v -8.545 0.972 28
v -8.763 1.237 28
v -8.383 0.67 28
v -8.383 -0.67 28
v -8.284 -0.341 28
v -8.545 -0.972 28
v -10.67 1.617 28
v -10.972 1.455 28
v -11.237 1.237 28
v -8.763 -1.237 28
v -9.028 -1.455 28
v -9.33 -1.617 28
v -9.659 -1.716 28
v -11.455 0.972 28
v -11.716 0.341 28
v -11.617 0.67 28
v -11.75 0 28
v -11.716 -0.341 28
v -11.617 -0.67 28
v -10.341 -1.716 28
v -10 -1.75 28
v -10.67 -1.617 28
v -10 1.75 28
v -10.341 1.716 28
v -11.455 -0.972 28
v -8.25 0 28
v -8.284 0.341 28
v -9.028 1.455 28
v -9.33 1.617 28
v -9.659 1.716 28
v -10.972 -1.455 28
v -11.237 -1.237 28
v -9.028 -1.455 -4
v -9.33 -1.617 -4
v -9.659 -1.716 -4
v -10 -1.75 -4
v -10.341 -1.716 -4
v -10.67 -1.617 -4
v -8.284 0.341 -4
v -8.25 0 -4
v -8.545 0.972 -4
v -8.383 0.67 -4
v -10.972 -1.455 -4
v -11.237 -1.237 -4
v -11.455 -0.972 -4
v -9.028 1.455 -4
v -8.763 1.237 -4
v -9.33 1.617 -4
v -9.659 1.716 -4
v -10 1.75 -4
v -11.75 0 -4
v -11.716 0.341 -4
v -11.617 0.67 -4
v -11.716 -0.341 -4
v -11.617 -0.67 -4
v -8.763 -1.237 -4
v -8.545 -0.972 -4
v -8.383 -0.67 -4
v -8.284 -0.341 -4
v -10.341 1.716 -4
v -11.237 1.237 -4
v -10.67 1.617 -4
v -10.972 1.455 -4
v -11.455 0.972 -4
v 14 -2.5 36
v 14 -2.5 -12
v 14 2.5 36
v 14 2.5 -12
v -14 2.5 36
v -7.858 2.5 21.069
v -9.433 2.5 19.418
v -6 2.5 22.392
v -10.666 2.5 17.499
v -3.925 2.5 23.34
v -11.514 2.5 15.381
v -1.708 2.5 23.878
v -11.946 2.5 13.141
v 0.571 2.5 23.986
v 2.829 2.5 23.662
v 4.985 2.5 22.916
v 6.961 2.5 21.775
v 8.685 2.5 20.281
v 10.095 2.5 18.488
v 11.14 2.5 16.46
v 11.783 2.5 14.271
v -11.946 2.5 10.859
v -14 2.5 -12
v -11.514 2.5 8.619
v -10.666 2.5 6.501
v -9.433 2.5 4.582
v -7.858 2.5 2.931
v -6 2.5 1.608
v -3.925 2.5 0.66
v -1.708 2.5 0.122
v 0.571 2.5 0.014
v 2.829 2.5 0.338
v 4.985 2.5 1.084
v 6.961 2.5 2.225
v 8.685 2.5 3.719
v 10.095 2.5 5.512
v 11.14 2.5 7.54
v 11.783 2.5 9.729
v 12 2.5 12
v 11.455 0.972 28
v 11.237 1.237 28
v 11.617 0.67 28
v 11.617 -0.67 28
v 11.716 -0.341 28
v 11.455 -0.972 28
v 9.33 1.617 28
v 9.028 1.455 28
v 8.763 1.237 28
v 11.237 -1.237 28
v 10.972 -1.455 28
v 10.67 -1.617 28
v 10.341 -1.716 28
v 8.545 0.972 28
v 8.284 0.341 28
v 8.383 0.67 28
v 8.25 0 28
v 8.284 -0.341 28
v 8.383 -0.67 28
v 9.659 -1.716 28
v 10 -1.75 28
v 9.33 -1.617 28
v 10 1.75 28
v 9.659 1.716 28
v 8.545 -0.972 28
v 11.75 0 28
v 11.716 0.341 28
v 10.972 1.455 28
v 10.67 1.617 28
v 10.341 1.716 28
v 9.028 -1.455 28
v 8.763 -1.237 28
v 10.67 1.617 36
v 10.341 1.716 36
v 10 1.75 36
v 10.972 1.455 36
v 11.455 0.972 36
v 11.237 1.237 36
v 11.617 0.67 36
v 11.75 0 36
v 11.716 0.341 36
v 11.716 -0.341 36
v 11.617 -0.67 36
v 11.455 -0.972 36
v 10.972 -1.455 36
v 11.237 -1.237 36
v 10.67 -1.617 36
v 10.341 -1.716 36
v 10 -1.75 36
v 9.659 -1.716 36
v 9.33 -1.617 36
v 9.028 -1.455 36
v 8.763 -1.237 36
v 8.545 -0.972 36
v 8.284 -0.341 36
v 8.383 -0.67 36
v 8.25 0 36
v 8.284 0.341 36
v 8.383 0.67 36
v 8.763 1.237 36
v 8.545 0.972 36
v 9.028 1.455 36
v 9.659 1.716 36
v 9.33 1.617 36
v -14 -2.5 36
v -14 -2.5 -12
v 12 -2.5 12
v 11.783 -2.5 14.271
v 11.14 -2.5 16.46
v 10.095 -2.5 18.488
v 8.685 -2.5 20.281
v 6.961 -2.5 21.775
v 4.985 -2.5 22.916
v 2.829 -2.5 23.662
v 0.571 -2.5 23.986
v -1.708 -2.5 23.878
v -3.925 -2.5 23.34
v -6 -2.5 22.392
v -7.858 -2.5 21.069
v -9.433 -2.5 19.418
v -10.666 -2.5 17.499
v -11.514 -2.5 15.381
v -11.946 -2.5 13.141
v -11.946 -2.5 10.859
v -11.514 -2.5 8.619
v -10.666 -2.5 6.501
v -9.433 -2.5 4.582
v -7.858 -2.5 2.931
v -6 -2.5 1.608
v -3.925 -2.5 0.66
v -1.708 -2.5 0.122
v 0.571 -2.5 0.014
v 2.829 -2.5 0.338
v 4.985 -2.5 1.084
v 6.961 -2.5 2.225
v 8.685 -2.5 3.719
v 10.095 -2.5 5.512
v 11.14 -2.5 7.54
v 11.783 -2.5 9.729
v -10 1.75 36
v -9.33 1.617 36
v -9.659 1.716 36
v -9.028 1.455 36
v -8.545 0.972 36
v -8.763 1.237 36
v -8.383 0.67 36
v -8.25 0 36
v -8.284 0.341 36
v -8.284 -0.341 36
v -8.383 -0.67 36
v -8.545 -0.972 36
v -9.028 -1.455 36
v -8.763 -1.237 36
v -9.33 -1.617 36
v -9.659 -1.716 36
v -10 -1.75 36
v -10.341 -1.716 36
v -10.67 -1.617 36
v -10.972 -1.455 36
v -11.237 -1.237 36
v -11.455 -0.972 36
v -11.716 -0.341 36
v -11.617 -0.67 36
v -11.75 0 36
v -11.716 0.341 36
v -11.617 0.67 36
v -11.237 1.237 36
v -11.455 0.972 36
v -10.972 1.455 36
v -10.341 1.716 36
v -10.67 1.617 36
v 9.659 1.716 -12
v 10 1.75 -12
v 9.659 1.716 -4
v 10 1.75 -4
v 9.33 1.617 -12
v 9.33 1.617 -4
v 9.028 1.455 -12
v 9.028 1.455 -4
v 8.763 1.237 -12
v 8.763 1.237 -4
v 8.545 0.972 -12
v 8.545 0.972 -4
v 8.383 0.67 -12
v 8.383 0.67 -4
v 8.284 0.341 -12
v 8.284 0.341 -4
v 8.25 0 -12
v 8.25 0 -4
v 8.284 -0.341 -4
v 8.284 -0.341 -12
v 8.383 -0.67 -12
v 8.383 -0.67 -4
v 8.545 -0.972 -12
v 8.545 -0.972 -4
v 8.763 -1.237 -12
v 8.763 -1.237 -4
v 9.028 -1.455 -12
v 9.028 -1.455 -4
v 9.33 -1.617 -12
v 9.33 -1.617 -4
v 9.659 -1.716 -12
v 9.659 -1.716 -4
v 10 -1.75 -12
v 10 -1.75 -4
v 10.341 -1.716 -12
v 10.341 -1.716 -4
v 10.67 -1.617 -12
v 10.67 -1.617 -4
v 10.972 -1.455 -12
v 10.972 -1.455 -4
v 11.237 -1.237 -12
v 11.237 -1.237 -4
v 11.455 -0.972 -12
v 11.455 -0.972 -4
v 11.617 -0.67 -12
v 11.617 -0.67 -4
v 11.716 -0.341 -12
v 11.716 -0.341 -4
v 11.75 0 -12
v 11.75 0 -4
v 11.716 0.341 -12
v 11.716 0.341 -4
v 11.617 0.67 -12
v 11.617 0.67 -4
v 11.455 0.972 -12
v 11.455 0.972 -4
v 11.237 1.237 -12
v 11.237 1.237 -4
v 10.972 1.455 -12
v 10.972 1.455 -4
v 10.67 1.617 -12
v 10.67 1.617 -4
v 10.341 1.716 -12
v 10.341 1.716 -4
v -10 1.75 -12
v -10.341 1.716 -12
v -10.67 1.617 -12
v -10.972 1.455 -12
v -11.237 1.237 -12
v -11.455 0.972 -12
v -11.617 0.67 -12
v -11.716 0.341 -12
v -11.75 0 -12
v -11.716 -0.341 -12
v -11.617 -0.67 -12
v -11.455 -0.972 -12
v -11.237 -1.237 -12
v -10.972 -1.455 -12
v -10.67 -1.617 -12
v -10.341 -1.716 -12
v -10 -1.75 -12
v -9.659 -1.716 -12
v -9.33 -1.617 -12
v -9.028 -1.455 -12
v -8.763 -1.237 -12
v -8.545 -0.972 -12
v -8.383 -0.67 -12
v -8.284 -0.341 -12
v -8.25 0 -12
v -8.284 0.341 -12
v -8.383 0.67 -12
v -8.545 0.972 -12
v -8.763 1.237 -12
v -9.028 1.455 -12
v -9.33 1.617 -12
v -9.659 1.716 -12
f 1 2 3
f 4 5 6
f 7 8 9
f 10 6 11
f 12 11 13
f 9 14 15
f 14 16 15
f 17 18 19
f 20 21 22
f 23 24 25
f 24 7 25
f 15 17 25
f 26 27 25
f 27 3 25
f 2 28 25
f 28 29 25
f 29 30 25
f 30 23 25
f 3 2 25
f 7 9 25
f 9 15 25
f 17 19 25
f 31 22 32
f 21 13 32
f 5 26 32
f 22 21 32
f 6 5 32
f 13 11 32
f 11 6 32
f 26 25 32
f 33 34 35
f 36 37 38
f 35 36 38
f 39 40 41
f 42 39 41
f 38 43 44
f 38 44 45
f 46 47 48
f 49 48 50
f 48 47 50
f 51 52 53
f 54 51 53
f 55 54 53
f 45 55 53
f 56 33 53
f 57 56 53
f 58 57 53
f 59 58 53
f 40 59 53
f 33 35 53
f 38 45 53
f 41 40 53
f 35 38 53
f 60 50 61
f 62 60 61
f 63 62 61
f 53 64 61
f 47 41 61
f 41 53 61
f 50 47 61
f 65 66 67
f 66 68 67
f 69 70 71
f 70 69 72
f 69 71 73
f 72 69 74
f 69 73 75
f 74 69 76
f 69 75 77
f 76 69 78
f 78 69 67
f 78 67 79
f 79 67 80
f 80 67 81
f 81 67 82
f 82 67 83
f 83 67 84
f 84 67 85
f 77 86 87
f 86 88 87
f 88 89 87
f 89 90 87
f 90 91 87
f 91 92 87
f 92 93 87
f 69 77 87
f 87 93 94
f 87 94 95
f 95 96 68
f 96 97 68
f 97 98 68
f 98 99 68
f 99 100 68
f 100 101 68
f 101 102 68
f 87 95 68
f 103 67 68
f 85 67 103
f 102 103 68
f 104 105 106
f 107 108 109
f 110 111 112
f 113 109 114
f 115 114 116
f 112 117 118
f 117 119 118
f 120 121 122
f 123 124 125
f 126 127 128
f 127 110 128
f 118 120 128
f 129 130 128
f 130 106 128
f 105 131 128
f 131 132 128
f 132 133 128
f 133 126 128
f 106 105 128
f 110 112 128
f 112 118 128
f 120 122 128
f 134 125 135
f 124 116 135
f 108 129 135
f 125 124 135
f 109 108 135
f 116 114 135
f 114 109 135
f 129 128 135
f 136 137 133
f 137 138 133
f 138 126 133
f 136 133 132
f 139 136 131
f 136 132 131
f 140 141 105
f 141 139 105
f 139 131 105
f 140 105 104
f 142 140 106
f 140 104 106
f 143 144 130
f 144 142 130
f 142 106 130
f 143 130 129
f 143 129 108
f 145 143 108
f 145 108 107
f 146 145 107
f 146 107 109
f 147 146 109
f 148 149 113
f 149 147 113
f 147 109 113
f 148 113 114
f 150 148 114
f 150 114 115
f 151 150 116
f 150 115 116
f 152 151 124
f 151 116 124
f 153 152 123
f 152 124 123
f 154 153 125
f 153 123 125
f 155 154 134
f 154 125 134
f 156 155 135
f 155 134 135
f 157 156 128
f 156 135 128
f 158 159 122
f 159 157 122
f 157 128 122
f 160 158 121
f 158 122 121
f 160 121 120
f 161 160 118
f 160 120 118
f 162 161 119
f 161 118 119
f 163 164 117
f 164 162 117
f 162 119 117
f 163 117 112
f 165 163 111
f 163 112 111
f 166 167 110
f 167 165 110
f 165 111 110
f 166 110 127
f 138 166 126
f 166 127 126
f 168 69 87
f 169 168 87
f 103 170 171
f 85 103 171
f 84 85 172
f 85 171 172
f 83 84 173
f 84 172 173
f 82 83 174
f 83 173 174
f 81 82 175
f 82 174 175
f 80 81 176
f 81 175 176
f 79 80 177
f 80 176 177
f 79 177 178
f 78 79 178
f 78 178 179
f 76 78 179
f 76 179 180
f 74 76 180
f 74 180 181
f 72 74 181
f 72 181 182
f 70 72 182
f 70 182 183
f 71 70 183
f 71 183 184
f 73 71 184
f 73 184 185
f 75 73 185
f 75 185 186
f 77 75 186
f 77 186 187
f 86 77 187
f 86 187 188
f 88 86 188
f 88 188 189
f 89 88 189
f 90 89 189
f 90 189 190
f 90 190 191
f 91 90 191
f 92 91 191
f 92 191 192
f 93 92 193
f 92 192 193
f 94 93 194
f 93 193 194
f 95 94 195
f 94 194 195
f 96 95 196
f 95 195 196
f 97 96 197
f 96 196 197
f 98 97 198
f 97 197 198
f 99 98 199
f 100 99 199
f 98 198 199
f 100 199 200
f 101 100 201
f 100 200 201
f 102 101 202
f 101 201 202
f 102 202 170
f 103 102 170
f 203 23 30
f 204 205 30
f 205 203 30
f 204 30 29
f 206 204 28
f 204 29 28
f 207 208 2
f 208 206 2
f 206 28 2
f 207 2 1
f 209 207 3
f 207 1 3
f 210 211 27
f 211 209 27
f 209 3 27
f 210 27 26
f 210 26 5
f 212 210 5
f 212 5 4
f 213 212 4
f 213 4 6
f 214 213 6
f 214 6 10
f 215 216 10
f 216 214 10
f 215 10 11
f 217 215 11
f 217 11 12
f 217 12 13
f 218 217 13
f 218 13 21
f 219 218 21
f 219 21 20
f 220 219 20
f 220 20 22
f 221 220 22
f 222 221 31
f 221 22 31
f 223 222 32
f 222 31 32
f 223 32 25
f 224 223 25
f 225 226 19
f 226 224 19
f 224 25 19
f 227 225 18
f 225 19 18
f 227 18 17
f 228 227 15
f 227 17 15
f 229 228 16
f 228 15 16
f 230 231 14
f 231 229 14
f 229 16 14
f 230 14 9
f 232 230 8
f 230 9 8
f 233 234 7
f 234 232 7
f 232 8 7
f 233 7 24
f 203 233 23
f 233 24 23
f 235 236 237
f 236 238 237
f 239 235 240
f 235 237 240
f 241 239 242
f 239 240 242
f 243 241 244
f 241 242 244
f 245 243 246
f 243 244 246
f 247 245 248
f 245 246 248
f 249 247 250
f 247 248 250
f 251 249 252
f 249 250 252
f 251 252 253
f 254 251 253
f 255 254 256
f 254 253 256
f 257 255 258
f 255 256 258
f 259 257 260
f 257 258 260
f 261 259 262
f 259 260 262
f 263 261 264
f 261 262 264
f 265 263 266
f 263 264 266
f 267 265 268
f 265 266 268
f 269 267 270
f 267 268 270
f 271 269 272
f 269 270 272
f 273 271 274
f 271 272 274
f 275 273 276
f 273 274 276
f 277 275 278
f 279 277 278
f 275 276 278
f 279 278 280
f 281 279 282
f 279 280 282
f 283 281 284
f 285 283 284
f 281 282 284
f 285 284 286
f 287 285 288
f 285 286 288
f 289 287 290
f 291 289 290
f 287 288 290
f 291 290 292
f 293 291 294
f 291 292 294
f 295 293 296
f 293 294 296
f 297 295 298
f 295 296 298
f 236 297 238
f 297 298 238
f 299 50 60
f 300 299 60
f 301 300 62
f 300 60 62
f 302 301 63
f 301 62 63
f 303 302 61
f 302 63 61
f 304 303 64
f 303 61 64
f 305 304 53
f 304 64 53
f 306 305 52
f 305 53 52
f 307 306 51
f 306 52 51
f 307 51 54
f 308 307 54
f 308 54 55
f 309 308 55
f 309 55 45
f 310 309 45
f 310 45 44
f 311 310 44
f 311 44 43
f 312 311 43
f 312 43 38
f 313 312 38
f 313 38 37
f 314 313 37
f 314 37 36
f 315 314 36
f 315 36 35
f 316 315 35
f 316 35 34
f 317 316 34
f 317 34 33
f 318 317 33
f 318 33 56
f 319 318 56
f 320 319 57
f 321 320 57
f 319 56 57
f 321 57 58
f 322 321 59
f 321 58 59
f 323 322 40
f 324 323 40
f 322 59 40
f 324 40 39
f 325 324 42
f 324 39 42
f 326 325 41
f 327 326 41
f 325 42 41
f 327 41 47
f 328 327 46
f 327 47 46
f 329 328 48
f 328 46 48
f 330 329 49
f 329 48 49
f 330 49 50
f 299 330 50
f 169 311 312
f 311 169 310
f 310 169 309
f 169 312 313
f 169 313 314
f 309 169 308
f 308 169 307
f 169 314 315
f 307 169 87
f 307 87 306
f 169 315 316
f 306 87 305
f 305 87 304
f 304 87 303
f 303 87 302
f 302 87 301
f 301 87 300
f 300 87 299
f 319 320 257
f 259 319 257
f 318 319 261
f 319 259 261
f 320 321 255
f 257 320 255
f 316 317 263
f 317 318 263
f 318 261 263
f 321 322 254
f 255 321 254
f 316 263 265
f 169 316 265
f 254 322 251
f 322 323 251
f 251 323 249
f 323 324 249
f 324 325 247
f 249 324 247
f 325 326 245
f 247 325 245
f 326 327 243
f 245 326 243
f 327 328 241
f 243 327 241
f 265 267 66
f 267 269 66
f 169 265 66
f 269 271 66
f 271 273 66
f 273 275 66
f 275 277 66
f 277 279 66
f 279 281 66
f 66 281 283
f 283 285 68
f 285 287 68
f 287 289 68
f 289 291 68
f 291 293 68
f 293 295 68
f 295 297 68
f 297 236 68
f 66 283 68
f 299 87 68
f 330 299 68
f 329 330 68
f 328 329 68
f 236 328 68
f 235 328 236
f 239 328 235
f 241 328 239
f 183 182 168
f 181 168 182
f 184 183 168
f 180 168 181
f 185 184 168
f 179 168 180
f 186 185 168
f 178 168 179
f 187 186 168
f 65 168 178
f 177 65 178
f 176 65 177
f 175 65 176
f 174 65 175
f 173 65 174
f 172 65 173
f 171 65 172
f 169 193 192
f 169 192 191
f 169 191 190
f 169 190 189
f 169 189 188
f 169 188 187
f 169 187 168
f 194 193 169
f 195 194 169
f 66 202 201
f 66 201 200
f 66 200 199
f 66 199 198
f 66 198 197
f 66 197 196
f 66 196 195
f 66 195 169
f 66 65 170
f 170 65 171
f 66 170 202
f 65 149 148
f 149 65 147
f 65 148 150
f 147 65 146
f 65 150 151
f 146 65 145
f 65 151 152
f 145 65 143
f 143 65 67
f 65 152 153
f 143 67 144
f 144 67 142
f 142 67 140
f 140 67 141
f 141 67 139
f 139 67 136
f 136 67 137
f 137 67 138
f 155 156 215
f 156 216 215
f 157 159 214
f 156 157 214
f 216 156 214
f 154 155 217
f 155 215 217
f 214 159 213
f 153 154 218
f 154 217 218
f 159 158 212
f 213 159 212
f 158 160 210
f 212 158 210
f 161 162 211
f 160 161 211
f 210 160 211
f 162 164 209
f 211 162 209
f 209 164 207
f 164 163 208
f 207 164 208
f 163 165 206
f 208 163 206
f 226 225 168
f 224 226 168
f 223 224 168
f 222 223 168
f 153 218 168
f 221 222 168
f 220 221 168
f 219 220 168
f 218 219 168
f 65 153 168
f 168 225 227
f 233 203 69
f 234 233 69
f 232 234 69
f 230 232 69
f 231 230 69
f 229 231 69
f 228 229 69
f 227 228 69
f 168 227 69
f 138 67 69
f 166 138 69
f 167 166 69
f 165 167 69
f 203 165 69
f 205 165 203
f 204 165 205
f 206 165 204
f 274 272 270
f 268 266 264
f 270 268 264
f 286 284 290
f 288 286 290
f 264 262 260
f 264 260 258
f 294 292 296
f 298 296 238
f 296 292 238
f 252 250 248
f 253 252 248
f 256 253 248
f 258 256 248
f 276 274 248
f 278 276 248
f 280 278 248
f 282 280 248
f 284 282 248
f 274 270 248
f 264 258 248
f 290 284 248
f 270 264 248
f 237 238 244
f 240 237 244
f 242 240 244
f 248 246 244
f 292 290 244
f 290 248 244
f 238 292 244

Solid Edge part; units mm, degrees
sketch "Sketch1" plane through (0, 0, 0) normal (0, -1, 0) x (1, 0, 0)
  line L0 (-14, -12) -> (14, -12)
  line L1 (14, -12) -> (14, 12)
  line L2 (14, 12) -> (-14, 12)
  line L3 (-14, 12) -> (-14, -12)
  dimension "D1" = 24
  dimension "D2" = 28
extrude "Protrusion1" add sketch "Sketch1" along normal mid plane 5
sketch "Sketch2" plane through (0, -2.5, 0) normal (0, -1, 0) x (1, 0, 0)
  circle A0 centre (0, 12) radius 12
  dimension "D1" = 24
extrude "Extrusionsausschnitt_1" cut sketch "Sketch2" against normal blind 221
hole "Bohrung_1" at (-10, 0, -12) direction (0, 0, 1) diameter 3.5 depth 8
hole "Hole1" at (10, 0, -12) direction (0, 0, 1) diameter 3.5 depth 8
mirror "Mirror1" about plane through (-13.5, 0, 12) normal (0, 0, 1) of "Protrusion1", "Extrusionsausschnitt_1", "Bohrung_1", "Hole1"
properties material "Aluminiumlegierung:3.0205, Al 99.0, EN-AW 1200"
